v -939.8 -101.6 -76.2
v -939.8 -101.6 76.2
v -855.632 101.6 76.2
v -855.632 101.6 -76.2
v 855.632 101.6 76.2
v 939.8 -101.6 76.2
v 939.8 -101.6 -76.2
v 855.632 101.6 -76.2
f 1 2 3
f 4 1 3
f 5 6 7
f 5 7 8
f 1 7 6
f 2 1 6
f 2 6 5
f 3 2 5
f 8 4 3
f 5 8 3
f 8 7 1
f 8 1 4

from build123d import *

# Parameters (mm, degrees)
F0_W     = 203.2
F0_H     = 152.4
F1_DEPTH = 939.8
F3_DEPTH = 152.401


# Not quite as in the source:
# - a pattern or mirror of a feature is missing from the dataset's text; its kind, count and spacing are read off the source's solid


with BuildPart() as f1:
    # F0 (on Right) → F1 (new body, symmetric)
    with BuildSketch(Plane.YZ):
        Rectangle(F0_W, F0_H)
    extrude(amount=F1_DEPTH, both=True)

    # F2 (on face) → F3 (cut, through all)
    with BuildSketch(Plane.XY.offset(76.2)):
        Polygon((-939.8, 101.6), (-939.8, -101.6), (-855.6318041258, 101.6), align=None)
    f3 = extrude(amount=-F3_DEPTH, mode=Mode.SUBTRACT)

    # F3_copies: F3 across plane
    add(f3.mirror(Plane(origin=(0, 0, 0), x_dir=(0, 0, 1), z_dir=(1, 0, 0))), mode=Mode.SUBTRACT)


solid = f1.part
